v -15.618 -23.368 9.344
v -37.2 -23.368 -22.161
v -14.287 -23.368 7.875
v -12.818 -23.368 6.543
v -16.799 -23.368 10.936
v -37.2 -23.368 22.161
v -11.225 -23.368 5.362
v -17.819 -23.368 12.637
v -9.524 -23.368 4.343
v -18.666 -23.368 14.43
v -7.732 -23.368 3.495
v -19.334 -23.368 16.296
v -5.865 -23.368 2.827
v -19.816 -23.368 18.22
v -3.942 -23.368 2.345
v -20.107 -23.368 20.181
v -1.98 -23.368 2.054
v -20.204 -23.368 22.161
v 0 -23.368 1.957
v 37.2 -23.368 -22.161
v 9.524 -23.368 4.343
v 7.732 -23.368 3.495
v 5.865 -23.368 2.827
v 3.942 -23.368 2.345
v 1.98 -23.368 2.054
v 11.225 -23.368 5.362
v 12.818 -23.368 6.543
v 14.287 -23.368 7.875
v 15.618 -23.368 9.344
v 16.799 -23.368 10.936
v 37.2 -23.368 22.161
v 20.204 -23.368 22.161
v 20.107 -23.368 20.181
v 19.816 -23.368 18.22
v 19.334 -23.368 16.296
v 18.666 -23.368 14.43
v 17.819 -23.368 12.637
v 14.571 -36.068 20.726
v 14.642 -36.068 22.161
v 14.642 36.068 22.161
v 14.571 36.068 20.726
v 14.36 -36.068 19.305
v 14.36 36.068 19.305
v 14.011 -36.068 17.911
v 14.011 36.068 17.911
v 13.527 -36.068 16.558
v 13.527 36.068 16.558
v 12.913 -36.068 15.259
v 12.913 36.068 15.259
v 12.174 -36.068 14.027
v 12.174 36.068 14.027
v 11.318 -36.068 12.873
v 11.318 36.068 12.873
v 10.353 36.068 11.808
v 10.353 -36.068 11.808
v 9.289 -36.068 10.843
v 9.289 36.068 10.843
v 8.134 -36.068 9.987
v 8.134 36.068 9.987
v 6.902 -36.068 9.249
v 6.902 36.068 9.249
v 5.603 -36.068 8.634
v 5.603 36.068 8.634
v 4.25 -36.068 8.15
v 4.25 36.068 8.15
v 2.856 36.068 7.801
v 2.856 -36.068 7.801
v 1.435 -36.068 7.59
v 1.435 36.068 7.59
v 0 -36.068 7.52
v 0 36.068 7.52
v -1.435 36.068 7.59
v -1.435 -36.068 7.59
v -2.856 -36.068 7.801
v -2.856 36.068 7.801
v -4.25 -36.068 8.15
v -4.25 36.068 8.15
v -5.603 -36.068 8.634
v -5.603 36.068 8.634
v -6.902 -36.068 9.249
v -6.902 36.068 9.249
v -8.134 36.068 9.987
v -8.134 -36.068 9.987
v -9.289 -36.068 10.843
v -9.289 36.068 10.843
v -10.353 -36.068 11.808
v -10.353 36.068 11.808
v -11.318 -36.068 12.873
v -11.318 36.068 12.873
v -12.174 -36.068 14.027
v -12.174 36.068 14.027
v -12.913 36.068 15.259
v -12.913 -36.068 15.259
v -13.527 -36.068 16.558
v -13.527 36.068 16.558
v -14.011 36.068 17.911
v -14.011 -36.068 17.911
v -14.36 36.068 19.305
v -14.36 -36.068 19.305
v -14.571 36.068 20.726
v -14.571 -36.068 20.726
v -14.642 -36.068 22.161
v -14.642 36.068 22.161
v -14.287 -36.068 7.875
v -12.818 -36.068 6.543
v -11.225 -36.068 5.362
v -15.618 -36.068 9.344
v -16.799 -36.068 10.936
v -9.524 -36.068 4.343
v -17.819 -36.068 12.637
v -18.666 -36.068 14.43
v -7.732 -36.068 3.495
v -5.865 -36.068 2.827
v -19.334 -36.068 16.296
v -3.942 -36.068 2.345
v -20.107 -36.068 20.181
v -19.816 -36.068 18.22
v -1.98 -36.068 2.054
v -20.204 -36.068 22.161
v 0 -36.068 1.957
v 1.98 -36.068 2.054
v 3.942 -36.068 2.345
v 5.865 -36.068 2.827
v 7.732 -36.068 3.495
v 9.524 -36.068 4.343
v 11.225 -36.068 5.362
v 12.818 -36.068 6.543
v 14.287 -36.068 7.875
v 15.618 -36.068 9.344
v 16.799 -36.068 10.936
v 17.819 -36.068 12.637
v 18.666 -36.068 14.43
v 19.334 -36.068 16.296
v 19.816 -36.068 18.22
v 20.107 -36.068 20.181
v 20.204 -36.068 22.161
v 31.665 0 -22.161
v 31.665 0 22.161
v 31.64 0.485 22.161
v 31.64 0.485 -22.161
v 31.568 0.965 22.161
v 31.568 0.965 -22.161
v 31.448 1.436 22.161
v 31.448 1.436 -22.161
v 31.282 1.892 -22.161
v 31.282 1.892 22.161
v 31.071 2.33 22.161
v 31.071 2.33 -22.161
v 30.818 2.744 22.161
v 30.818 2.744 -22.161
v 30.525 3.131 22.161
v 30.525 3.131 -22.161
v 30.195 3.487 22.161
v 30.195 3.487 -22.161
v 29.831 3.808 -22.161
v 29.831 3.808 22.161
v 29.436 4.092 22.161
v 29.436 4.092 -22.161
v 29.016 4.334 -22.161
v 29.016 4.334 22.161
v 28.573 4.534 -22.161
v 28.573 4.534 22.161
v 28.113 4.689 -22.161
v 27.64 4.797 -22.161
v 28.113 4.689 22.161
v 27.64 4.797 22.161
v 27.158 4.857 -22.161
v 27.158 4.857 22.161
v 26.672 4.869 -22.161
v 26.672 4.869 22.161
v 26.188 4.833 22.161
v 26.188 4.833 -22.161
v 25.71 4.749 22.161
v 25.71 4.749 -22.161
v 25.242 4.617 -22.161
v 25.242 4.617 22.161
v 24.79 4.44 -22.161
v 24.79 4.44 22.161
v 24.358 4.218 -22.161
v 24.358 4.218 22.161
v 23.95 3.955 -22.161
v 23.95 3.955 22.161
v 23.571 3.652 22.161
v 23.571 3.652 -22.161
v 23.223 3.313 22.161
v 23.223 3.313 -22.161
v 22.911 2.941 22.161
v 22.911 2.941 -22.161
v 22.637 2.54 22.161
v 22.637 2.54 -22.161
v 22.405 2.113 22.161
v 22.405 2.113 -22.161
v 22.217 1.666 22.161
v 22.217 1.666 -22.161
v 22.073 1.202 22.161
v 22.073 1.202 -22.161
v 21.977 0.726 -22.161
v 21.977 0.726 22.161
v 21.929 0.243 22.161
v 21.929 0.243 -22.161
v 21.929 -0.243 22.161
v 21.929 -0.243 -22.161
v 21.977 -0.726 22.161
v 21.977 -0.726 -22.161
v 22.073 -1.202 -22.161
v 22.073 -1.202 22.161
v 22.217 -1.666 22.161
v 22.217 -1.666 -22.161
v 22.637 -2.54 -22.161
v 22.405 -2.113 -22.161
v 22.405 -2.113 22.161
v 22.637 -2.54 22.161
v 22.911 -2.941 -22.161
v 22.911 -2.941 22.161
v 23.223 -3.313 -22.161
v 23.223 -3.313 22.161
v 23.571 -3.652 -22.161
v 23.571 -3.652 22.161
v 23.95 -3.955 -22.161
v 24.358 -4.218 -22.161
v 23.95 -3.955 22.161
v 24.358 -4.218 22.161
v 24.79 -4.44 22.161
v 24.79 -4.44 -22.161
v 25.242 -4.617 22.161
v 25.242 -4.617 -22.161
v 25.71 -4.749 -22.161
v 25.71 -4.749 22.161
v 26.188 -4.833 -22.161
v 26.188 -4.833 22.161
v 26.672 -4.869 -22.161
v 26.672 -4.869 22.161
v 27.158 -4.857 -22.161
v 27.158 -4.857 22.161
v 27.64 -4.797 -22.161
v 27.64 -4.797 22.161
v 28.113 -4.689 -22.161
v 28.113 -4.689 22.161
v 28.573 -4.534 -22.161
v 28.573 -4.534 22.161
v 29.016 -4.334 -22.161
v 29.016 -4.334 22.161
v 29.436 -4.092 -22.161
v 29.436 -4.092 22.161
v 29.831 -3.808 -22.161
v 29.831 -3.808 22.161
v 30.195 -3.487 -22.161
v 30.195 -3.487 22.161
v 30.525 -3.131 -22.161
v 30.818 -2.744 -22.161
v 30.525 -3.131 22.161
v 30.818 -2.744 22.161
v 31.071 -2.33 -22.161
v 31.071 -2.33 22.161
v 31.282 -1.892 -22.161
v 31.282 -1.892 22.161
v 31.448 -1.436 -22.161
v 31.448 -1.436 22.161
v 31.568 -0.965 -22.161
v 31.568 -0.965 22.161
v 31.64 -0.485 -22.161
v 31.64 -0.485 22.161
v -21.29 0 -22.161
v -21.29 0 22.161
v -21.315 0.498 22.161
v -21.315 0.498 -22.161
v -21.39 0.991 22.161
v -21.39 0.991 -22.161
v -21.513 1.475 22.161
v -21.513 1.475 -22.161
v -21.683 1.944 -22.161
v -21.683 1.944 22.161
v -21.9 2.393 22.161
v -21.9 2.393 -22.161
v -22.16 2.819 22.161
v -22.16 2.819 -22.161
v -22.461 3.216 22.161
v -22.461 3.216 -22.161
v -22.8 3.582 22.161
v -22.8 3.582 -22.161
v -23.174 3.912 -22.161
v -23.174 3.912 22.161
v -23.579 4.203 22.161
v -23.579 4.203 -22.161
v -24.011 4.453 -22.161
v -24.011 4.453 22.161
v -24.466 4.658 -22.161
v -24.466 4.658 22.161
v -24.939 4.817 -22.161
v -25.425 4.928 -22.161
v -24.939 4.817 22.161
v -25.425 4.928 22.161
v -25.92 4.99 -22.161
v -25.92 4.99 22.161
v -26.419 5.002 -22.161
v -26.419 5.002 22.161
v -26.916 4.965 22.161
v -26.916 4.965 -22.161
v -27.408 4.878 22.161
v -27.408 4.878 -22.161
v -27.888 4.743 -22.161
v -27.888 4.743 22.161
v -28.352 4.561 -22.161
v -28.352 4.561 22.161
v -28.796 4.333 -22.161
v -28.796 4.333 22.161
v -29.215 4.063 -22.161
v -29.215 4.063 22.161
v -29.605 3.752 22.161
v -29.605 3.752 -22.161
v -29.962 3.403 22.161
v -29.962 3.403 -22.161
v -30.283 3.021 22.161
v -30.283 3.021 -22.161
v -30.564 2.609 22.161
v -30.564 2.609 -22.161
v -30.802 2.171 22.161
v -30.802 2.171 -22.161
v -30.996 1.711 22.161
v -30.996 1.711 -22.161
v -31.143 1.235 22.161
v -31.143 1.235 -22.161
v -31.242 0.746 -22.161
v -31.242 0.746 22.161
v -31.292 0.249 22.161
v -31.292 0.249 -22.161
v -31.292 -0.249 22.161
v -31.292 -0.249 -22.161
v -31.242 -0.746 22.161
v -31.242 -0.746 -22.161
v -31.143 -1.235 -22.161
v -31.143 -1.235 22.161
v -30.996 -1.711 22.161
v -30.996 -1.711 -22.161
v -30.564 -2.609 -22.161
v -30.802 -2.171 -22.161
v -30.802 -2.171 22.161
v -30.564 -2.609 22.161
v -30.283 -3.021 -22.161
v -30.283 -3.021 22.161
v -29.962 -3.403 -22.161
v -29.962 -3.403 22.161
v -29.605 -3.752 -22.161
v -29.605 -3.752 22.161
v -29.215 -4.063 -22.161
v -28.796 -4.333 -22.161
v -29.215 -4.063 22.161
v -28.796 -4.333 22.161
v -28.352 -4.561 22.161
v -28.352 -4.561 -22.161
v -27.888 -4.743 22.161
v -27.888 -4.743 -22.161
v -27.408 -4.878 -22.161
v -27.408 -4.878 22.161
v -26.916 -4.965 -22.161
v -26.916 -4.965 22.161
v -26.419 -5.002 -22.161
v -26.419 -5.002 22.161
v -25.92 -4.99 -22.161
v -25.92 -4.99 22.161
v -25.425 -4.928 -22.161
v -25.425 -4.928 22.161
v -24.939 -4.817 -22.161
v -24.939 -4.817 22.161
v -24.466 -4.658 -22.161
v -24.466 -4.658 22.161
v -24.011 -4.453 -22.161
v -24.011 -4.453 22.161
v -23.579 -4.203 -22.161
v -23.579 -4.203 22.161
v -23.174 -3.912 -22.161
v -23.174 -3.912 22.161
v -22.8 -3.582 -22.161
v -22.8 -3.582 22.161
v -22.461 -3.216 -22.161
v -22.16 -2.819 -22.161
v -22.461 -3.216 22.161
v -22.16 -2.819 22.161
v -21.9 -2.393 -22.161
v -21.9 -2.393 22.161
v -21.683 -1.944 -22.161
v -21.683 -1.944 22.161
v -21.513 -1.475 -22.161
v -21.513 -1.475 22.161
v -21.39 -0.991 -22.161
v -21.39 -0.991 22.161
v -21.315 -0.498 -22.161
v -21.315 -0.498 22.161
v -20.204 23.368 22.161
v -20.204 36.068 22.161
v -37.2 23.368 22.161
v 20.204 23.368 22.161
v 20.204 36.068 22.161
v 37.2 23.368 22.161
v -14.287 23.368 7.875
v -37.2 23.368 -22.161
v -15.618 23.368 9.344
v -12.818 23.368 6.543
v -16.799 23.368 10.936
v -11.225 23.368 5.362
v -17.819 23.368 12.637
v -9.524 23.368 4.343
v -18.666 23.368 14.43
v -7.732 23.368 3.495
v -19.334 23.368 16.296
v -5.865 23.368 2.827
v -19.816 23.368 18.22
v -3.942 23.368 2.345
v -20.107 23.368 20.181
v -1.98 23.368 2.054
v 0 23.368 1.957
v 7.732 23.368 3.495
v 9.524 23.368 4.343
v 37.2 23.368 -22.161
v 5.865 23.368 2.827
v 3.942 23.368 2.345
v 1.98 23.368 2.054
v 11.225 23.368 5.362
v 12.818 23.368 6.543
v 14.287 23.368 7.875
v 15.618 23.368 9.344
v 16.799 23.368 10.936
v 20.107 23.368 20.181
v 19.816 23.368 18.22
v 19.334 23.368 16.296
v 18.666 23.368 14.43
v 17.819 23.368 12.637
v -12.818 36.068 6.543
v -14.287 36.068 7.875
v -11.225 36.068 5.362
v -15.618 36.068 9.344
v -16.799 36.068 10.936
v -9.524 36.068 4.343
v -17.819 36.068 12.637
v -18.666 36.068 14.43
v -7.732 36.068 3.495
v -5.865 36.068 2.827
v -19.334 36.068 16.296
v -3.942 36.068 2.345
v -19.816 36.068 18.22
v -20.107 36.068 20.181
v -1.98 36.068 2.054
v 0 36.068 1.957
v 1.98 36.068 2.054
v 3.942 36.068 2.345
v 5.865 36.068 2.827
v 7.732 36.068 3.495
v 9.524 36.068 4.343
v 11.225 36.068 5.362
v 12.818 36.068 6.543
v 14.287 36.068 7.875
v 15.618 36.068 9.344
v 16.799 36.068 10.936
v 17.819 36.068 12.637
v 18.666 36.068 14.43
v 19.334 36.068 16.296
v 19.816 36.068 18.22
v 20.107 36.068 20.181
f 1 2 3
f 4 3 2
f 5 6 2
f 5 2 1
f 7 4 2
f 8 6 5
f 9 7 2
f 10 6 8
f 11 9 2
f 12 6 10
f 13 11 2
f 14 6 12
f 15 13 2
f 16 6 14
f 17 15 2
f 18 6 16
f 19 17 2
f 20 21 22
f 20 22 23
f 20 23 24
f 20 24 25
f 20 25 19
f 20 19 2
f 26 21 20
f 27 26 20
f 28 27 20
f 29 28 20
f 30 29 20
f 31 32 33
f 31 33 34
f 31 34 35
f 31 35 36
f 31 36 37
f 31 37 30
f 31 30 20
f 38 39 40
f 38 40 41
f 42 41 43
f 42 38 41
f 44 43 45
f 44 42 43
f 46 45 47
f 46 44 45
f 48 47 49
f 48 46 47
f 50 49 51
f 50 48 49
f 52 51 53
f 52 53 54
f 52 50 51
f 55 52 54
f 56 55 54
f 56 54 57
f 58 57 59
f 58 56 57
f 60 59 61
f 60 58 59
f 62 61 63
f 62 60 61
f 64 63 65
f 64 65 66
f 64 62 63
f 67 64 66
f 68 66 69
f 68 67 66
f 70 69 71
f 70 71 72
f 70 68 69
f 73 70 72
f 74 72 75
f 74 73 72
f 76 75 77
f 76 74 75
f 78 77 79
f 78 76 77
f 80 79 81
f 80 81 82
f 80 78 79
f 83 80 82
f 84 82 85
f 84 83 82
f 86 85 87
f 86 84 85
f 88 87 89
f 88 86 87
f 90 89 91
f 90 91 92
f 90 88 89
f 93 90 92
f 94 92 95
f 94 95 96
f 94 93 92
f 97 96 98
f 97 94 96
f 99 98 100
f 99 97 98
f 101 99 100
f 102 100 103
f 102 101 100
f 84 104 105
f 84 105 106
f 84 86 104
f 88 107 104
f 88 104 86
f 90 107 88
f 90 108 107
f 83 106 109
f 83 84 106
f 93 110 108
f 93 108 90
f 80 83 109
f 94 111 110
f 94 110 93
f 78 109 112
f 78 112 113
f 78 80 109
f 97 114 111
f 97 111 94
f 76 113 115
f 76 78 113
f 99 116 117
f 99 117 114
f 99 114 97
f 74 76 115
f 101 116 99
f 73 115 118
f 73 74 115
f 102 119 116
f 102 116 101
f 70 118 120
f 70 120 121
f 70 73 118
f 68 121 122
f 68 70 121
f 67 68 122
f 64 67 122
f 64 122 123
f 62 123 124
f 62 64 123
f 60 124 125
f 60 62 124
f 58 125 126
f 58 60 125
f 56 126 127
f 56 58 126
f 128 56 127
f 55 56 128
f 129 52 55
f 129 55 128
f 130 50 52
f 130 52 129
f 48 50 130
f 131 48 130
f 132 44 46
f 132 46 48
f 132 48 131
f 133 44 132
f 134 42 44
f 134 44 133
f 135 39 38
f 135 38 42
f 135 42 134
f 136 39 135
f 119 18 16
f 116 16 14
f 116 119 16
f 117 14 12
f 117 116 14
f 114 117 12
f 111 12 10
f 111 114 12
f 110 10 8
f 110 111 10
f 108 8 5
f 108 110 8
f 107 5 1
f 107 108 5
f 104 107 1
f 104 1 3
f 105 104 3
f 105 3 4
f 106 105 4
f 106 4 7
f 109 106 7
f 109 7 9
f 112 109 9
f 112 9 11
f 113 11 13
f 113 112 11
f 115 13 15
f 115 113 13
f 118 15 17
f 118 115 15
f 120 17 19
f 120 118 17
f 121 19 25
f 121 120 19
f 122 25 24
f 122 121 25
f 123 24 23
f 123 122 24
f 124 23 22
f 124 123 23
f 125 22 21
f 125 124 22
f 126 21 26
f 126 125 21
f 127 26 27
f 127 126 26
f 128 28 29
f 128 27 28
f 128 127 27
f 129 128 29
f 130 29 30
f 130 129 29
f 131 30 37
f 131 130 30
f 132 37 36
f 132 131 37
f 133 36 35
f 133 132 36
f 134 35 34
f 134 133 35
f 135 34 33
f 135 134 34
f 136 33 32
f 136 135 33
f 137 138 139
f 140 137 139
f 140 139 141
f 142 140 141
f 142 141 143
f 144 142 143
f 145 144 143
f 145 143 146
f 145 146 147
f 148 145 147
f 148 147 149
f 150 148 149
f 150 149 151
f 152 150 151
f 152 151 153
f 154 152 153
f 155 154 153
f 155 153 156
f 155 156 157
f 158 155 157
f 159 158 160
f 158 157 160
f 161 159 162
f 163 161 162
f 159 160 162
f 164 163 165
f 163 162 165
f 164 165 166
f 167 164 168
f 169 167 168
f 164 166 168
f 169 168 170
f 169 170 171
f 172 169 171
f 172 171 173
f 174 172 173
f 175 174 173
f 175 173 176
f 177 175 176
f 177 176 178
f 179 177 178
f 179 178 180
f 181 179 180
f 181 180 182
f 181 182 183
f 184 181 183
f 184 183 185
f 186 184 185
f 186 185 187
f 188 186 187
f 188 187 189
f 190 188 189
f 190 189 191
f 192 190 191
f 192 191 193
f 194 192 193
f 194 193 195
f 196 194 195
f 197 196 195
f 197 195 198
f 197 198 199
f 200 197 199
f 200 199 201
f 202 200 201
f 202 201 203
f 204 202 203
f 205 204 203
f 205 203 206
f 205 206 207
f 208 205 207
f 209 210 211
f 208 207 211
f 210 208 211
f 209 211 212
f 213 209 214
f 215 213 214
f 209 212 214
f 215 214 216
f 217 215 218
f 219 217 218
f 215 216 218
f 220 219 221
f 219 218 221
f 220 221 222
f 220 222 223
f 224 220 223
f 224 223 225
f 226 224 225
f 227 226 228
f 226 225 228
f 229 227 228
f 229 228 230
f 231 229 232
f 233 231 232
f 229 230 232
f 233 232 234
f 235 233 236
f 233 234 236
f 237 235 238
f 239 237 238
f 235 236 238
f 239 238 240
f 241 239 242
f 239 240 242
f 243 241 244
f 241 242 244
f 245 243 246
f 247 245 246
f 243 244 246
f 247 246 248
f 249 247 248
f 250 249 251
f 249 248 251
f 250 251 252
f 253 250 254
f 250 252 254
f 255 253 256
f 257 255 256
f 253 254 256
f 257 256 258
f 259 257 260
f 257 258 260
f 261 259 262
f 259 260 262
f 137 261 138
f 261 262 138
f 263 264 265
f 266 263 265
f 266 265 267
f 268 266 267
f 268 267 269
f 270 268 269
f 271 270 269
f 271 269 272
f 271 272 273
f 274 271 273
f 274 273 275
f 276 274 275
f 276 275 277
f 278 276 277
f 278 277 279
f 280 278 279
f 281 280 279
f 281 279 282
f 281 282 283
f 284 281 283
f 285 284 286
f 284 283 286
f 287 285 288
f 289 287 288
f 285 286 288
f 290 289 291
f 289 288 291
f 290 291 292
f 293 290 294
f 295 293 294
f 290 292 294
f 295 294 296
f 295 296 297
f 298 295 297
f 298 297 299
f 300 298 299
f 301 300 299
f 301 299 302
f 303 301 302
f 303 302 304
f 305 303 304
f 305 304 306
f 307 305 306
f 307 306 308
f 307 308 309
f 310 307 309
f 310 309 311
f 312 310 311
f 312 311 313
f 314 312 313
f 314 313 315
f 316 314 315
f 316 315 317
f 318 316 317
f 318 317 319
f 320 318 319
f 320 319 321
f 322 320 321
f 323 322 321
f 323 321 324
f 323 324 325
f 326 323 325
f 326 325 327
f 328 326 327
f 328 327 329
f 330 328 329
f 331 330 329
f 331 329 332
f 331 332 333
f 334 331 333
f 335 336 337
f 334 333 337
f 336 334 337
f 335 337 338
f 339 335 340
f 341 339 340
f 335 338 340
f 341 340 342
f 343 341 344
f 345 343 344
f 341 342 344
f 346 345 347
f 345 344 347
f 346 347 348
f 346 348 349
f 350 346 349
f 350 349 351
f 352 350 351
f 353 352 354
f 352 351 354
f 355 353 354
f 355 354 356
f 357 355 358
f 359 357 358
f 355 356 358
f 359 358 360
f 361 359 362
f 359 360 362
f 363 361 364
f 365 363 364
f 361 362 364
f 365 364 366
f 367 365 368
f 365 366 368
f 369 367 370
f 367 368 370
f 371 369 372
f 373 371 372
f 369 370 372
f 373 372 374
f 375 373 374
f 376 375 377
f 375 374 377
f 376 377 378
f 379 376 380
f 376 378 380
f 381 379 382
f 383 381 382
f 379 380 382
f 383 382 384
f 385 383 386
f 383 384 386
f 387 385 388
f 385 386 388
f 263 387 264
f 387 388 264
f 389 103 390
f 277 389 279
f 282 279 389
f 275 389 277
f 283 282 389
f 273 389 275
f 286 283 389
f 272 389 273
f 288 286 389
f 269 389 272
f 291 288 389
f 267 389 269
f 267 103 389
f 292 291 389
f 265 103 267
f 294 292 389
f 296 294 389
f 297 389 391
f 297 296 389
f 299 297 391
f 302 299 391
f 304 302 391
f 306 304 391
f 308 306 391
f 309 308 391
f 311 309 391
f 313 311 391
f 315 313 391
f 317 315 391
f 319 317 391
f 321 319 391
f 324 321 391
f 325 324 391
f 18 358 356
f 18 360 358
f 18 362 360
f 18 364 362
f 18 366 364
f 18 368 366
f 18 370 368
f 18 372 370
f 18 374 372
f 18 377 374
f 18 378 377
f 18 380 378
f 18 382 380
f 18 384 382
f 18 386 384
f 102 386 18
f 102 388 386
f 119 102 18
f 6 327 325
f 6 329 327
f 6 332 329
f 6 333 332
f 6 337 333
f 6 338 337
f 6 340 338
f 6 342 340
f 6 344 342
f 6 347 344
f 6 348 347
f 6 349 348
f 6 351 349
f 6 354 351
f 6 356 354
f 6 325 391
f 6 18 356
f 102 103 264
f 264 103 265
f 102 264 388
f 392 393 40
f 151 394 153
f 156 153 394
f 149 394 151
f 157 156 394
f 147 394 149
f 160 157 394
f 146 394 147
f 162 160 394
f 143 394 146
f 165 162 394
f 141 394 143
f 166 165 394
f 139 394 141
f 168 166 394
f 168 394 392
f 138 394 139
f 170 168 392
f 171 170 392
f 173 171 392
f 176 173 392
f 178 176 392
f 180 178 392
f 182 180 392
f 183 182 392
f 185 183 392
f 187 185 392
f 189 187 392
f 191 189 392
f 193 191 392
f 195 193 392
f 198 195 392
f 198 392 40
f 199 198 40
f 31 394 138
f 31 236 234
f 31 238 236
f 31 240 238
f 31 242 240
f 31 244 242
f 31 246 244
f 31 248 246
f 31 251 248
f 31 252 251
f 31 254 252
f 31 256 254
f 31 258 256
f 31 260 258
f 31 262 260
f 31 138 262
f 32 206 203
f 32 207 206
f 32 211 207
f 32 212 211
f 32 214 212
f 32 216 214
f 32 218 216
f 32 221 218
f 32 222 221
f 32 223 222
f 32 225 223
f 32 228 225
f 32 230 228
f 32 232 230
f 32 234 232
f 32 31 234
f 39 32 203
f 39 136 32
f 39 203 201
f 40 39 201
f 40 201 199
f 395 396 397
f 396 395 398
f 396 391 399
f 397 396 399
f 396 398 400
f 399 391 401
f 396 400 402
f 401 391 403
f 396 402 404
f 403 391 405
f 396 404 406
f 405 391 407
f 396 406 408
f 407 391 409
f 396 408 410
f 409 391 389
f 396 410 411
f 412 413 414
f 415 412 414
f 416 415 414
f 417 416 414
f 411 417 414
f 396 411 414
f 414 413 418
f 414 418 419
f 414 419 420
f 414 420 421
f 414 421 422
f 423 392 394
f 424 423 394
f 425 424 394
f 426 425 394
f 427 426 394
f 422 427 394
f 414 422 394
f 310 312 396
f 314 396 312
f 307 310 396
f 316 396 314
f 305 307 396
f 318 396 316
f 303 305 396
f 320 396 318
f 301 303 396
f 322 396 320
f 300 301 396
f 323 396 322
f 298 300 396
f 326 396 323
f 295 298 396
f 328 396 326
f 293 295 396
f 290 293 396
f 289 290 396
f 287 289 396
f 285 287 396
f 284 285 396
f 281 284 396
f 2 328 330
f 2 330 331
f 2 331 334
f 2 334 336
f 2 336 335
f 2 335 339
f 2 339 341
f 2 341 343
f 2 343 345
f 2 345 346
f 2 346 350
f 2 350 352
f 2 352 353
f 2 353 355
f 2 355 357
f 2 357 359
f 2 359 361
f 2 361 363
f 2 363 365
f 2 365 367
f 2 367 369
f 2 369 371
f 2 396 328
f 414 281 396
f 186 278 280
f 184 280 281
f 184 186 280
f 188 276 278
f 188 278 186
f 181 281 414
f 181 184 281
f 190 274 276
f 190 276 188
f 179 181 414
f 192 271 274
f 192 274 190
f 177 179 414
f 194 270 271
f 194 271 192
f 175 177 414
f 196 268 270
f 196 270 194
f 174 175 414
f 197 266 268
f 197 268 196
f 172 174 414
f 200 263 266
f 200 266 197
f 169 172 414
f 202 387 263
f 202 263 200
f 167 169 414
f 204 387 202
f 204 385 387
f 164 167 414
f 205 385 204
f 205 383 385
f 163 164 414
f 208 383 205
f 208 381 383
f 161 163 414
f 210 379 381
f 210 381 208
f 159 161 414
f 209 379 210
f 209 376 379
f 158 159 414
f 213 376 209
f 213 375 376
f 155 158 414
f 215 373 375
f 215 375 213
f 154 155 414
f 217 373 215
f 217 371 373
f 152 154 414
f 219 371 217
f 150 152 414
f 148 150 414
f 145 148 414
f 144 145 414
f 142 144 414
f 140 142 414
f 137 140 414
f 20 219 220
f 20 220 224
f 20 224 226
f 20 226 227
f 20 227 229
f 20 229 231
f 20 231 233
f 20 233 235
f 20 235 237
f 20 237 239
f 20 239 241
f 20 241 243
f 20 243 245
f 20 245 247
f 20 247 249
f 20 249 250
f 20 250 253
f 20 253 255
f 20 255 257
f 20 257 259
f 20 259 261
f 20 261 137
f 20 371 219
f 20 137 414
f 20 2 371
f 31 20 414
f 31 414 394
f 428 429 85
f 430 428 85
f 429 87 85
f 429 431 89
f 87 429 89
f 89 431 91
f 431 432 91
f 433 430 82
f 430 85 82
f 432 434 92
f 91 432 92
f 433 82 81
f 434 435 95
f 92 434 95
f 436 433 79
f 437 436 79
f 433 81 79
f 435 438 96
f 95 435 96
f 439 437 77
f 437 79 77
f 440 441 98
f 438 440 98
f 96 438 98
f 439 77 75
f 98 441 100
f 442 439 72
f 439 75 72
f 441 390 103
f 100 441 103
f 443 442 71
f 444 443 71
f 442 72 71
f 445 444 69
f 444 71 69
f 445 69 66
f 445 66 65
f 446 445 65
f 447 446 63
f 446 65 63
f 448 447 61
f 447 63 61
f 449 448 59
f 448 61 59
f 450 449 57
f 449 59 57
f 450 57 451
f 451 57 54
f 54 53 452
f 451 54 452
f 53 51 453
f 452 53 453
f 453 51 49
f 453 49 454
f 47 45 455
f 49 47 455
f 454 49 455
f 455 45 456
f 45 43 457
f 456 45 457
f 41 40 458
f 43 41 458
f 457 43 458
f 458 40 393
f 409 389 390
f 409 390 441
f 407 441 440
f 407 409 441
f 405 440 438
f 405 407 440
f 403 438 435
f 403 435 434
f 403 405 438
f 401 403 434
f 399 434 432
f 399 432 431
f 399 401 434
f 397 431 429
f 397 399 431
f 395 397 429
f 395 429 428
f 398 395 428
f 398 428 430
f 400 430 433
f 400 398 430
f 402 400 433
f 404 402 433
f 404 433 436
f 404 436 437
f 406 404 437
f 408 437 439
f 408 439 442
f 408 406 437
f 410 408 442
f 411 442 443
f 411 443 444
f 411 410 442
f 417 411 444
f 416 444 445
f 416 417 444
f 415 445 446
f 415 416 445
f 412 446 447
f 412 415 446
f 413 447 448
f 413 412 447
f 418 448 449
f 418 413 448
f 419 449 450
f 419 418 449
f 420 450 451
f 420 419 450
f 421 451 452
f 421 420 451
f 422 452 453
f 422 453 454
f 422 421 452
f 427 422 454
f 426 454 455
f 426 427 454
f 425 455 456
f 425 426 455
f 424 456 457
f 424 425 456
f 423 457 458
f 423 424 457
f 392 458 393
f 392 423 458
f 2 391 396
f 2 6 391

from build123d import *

# Parameters (mm, degrees)
F1_DEPTH = 23.368
F2_DEPTH = 36.068
F3_R     = 5.00372
F3_R_2   = 4.870923
F4_DEPTH = 64.008


with BuildPart() as f1:
    # F0 (on Front) → F1 (new body, symmetric)
    with BuildSketch(Plane.XZ):
        with BuildLine():
            Line((-37.199613, -22.161454), (37.199613, -22.161454))
            Line((37.199613, -22.161454), (37.199613, 22.161454))
            Line((37.199613, 22.161454), (20.20446, 22.161454))
            ThreePointArc((20.20446, 22.161454), (0, 1.956994), (-20.20446, 22.161454))
            Line((-20.20446, 22.161454), (-37.199613, 22.161454))
            Line((-37.199613, 22.161454), (-37.199613, -22.161454))
        make_face()
    extrude(amount=F1_DEPTH, both=True)

    # F0 (on Front) → F2 (join, symmetric)
    with BuildSketch(Plane.XZ):
        with BuildLine():
            ThreePointArc((-20.20446, 22.161454), (0, 1.956994), (20.20446, 22.161454))
            Line((20.20446, 22.161454), (14.641577, 22.161454))
            ThreePointArc((14.641577, 22.161454), (0, 7.519877), (-14.641577, 22.161454))
            Line((-14.641577, 22.161454), (-20.20446, 22.161454))
        make_face()
    extrude(amount=F2_DEPTH, both=True)

    # F3 (on face) → F4 (cut)
    with BuildSketch(Plane.XY.offset(22.161454)):
        with Locations((-26.294084, 0)):
            Circle(F3_R)
        with Locations((26.79375, 0)):
            Circle(F3_R_2)
    extrude(amount=-F4_DEPTH, mode=Mode.SUBTRACT)


solid = f1.part
